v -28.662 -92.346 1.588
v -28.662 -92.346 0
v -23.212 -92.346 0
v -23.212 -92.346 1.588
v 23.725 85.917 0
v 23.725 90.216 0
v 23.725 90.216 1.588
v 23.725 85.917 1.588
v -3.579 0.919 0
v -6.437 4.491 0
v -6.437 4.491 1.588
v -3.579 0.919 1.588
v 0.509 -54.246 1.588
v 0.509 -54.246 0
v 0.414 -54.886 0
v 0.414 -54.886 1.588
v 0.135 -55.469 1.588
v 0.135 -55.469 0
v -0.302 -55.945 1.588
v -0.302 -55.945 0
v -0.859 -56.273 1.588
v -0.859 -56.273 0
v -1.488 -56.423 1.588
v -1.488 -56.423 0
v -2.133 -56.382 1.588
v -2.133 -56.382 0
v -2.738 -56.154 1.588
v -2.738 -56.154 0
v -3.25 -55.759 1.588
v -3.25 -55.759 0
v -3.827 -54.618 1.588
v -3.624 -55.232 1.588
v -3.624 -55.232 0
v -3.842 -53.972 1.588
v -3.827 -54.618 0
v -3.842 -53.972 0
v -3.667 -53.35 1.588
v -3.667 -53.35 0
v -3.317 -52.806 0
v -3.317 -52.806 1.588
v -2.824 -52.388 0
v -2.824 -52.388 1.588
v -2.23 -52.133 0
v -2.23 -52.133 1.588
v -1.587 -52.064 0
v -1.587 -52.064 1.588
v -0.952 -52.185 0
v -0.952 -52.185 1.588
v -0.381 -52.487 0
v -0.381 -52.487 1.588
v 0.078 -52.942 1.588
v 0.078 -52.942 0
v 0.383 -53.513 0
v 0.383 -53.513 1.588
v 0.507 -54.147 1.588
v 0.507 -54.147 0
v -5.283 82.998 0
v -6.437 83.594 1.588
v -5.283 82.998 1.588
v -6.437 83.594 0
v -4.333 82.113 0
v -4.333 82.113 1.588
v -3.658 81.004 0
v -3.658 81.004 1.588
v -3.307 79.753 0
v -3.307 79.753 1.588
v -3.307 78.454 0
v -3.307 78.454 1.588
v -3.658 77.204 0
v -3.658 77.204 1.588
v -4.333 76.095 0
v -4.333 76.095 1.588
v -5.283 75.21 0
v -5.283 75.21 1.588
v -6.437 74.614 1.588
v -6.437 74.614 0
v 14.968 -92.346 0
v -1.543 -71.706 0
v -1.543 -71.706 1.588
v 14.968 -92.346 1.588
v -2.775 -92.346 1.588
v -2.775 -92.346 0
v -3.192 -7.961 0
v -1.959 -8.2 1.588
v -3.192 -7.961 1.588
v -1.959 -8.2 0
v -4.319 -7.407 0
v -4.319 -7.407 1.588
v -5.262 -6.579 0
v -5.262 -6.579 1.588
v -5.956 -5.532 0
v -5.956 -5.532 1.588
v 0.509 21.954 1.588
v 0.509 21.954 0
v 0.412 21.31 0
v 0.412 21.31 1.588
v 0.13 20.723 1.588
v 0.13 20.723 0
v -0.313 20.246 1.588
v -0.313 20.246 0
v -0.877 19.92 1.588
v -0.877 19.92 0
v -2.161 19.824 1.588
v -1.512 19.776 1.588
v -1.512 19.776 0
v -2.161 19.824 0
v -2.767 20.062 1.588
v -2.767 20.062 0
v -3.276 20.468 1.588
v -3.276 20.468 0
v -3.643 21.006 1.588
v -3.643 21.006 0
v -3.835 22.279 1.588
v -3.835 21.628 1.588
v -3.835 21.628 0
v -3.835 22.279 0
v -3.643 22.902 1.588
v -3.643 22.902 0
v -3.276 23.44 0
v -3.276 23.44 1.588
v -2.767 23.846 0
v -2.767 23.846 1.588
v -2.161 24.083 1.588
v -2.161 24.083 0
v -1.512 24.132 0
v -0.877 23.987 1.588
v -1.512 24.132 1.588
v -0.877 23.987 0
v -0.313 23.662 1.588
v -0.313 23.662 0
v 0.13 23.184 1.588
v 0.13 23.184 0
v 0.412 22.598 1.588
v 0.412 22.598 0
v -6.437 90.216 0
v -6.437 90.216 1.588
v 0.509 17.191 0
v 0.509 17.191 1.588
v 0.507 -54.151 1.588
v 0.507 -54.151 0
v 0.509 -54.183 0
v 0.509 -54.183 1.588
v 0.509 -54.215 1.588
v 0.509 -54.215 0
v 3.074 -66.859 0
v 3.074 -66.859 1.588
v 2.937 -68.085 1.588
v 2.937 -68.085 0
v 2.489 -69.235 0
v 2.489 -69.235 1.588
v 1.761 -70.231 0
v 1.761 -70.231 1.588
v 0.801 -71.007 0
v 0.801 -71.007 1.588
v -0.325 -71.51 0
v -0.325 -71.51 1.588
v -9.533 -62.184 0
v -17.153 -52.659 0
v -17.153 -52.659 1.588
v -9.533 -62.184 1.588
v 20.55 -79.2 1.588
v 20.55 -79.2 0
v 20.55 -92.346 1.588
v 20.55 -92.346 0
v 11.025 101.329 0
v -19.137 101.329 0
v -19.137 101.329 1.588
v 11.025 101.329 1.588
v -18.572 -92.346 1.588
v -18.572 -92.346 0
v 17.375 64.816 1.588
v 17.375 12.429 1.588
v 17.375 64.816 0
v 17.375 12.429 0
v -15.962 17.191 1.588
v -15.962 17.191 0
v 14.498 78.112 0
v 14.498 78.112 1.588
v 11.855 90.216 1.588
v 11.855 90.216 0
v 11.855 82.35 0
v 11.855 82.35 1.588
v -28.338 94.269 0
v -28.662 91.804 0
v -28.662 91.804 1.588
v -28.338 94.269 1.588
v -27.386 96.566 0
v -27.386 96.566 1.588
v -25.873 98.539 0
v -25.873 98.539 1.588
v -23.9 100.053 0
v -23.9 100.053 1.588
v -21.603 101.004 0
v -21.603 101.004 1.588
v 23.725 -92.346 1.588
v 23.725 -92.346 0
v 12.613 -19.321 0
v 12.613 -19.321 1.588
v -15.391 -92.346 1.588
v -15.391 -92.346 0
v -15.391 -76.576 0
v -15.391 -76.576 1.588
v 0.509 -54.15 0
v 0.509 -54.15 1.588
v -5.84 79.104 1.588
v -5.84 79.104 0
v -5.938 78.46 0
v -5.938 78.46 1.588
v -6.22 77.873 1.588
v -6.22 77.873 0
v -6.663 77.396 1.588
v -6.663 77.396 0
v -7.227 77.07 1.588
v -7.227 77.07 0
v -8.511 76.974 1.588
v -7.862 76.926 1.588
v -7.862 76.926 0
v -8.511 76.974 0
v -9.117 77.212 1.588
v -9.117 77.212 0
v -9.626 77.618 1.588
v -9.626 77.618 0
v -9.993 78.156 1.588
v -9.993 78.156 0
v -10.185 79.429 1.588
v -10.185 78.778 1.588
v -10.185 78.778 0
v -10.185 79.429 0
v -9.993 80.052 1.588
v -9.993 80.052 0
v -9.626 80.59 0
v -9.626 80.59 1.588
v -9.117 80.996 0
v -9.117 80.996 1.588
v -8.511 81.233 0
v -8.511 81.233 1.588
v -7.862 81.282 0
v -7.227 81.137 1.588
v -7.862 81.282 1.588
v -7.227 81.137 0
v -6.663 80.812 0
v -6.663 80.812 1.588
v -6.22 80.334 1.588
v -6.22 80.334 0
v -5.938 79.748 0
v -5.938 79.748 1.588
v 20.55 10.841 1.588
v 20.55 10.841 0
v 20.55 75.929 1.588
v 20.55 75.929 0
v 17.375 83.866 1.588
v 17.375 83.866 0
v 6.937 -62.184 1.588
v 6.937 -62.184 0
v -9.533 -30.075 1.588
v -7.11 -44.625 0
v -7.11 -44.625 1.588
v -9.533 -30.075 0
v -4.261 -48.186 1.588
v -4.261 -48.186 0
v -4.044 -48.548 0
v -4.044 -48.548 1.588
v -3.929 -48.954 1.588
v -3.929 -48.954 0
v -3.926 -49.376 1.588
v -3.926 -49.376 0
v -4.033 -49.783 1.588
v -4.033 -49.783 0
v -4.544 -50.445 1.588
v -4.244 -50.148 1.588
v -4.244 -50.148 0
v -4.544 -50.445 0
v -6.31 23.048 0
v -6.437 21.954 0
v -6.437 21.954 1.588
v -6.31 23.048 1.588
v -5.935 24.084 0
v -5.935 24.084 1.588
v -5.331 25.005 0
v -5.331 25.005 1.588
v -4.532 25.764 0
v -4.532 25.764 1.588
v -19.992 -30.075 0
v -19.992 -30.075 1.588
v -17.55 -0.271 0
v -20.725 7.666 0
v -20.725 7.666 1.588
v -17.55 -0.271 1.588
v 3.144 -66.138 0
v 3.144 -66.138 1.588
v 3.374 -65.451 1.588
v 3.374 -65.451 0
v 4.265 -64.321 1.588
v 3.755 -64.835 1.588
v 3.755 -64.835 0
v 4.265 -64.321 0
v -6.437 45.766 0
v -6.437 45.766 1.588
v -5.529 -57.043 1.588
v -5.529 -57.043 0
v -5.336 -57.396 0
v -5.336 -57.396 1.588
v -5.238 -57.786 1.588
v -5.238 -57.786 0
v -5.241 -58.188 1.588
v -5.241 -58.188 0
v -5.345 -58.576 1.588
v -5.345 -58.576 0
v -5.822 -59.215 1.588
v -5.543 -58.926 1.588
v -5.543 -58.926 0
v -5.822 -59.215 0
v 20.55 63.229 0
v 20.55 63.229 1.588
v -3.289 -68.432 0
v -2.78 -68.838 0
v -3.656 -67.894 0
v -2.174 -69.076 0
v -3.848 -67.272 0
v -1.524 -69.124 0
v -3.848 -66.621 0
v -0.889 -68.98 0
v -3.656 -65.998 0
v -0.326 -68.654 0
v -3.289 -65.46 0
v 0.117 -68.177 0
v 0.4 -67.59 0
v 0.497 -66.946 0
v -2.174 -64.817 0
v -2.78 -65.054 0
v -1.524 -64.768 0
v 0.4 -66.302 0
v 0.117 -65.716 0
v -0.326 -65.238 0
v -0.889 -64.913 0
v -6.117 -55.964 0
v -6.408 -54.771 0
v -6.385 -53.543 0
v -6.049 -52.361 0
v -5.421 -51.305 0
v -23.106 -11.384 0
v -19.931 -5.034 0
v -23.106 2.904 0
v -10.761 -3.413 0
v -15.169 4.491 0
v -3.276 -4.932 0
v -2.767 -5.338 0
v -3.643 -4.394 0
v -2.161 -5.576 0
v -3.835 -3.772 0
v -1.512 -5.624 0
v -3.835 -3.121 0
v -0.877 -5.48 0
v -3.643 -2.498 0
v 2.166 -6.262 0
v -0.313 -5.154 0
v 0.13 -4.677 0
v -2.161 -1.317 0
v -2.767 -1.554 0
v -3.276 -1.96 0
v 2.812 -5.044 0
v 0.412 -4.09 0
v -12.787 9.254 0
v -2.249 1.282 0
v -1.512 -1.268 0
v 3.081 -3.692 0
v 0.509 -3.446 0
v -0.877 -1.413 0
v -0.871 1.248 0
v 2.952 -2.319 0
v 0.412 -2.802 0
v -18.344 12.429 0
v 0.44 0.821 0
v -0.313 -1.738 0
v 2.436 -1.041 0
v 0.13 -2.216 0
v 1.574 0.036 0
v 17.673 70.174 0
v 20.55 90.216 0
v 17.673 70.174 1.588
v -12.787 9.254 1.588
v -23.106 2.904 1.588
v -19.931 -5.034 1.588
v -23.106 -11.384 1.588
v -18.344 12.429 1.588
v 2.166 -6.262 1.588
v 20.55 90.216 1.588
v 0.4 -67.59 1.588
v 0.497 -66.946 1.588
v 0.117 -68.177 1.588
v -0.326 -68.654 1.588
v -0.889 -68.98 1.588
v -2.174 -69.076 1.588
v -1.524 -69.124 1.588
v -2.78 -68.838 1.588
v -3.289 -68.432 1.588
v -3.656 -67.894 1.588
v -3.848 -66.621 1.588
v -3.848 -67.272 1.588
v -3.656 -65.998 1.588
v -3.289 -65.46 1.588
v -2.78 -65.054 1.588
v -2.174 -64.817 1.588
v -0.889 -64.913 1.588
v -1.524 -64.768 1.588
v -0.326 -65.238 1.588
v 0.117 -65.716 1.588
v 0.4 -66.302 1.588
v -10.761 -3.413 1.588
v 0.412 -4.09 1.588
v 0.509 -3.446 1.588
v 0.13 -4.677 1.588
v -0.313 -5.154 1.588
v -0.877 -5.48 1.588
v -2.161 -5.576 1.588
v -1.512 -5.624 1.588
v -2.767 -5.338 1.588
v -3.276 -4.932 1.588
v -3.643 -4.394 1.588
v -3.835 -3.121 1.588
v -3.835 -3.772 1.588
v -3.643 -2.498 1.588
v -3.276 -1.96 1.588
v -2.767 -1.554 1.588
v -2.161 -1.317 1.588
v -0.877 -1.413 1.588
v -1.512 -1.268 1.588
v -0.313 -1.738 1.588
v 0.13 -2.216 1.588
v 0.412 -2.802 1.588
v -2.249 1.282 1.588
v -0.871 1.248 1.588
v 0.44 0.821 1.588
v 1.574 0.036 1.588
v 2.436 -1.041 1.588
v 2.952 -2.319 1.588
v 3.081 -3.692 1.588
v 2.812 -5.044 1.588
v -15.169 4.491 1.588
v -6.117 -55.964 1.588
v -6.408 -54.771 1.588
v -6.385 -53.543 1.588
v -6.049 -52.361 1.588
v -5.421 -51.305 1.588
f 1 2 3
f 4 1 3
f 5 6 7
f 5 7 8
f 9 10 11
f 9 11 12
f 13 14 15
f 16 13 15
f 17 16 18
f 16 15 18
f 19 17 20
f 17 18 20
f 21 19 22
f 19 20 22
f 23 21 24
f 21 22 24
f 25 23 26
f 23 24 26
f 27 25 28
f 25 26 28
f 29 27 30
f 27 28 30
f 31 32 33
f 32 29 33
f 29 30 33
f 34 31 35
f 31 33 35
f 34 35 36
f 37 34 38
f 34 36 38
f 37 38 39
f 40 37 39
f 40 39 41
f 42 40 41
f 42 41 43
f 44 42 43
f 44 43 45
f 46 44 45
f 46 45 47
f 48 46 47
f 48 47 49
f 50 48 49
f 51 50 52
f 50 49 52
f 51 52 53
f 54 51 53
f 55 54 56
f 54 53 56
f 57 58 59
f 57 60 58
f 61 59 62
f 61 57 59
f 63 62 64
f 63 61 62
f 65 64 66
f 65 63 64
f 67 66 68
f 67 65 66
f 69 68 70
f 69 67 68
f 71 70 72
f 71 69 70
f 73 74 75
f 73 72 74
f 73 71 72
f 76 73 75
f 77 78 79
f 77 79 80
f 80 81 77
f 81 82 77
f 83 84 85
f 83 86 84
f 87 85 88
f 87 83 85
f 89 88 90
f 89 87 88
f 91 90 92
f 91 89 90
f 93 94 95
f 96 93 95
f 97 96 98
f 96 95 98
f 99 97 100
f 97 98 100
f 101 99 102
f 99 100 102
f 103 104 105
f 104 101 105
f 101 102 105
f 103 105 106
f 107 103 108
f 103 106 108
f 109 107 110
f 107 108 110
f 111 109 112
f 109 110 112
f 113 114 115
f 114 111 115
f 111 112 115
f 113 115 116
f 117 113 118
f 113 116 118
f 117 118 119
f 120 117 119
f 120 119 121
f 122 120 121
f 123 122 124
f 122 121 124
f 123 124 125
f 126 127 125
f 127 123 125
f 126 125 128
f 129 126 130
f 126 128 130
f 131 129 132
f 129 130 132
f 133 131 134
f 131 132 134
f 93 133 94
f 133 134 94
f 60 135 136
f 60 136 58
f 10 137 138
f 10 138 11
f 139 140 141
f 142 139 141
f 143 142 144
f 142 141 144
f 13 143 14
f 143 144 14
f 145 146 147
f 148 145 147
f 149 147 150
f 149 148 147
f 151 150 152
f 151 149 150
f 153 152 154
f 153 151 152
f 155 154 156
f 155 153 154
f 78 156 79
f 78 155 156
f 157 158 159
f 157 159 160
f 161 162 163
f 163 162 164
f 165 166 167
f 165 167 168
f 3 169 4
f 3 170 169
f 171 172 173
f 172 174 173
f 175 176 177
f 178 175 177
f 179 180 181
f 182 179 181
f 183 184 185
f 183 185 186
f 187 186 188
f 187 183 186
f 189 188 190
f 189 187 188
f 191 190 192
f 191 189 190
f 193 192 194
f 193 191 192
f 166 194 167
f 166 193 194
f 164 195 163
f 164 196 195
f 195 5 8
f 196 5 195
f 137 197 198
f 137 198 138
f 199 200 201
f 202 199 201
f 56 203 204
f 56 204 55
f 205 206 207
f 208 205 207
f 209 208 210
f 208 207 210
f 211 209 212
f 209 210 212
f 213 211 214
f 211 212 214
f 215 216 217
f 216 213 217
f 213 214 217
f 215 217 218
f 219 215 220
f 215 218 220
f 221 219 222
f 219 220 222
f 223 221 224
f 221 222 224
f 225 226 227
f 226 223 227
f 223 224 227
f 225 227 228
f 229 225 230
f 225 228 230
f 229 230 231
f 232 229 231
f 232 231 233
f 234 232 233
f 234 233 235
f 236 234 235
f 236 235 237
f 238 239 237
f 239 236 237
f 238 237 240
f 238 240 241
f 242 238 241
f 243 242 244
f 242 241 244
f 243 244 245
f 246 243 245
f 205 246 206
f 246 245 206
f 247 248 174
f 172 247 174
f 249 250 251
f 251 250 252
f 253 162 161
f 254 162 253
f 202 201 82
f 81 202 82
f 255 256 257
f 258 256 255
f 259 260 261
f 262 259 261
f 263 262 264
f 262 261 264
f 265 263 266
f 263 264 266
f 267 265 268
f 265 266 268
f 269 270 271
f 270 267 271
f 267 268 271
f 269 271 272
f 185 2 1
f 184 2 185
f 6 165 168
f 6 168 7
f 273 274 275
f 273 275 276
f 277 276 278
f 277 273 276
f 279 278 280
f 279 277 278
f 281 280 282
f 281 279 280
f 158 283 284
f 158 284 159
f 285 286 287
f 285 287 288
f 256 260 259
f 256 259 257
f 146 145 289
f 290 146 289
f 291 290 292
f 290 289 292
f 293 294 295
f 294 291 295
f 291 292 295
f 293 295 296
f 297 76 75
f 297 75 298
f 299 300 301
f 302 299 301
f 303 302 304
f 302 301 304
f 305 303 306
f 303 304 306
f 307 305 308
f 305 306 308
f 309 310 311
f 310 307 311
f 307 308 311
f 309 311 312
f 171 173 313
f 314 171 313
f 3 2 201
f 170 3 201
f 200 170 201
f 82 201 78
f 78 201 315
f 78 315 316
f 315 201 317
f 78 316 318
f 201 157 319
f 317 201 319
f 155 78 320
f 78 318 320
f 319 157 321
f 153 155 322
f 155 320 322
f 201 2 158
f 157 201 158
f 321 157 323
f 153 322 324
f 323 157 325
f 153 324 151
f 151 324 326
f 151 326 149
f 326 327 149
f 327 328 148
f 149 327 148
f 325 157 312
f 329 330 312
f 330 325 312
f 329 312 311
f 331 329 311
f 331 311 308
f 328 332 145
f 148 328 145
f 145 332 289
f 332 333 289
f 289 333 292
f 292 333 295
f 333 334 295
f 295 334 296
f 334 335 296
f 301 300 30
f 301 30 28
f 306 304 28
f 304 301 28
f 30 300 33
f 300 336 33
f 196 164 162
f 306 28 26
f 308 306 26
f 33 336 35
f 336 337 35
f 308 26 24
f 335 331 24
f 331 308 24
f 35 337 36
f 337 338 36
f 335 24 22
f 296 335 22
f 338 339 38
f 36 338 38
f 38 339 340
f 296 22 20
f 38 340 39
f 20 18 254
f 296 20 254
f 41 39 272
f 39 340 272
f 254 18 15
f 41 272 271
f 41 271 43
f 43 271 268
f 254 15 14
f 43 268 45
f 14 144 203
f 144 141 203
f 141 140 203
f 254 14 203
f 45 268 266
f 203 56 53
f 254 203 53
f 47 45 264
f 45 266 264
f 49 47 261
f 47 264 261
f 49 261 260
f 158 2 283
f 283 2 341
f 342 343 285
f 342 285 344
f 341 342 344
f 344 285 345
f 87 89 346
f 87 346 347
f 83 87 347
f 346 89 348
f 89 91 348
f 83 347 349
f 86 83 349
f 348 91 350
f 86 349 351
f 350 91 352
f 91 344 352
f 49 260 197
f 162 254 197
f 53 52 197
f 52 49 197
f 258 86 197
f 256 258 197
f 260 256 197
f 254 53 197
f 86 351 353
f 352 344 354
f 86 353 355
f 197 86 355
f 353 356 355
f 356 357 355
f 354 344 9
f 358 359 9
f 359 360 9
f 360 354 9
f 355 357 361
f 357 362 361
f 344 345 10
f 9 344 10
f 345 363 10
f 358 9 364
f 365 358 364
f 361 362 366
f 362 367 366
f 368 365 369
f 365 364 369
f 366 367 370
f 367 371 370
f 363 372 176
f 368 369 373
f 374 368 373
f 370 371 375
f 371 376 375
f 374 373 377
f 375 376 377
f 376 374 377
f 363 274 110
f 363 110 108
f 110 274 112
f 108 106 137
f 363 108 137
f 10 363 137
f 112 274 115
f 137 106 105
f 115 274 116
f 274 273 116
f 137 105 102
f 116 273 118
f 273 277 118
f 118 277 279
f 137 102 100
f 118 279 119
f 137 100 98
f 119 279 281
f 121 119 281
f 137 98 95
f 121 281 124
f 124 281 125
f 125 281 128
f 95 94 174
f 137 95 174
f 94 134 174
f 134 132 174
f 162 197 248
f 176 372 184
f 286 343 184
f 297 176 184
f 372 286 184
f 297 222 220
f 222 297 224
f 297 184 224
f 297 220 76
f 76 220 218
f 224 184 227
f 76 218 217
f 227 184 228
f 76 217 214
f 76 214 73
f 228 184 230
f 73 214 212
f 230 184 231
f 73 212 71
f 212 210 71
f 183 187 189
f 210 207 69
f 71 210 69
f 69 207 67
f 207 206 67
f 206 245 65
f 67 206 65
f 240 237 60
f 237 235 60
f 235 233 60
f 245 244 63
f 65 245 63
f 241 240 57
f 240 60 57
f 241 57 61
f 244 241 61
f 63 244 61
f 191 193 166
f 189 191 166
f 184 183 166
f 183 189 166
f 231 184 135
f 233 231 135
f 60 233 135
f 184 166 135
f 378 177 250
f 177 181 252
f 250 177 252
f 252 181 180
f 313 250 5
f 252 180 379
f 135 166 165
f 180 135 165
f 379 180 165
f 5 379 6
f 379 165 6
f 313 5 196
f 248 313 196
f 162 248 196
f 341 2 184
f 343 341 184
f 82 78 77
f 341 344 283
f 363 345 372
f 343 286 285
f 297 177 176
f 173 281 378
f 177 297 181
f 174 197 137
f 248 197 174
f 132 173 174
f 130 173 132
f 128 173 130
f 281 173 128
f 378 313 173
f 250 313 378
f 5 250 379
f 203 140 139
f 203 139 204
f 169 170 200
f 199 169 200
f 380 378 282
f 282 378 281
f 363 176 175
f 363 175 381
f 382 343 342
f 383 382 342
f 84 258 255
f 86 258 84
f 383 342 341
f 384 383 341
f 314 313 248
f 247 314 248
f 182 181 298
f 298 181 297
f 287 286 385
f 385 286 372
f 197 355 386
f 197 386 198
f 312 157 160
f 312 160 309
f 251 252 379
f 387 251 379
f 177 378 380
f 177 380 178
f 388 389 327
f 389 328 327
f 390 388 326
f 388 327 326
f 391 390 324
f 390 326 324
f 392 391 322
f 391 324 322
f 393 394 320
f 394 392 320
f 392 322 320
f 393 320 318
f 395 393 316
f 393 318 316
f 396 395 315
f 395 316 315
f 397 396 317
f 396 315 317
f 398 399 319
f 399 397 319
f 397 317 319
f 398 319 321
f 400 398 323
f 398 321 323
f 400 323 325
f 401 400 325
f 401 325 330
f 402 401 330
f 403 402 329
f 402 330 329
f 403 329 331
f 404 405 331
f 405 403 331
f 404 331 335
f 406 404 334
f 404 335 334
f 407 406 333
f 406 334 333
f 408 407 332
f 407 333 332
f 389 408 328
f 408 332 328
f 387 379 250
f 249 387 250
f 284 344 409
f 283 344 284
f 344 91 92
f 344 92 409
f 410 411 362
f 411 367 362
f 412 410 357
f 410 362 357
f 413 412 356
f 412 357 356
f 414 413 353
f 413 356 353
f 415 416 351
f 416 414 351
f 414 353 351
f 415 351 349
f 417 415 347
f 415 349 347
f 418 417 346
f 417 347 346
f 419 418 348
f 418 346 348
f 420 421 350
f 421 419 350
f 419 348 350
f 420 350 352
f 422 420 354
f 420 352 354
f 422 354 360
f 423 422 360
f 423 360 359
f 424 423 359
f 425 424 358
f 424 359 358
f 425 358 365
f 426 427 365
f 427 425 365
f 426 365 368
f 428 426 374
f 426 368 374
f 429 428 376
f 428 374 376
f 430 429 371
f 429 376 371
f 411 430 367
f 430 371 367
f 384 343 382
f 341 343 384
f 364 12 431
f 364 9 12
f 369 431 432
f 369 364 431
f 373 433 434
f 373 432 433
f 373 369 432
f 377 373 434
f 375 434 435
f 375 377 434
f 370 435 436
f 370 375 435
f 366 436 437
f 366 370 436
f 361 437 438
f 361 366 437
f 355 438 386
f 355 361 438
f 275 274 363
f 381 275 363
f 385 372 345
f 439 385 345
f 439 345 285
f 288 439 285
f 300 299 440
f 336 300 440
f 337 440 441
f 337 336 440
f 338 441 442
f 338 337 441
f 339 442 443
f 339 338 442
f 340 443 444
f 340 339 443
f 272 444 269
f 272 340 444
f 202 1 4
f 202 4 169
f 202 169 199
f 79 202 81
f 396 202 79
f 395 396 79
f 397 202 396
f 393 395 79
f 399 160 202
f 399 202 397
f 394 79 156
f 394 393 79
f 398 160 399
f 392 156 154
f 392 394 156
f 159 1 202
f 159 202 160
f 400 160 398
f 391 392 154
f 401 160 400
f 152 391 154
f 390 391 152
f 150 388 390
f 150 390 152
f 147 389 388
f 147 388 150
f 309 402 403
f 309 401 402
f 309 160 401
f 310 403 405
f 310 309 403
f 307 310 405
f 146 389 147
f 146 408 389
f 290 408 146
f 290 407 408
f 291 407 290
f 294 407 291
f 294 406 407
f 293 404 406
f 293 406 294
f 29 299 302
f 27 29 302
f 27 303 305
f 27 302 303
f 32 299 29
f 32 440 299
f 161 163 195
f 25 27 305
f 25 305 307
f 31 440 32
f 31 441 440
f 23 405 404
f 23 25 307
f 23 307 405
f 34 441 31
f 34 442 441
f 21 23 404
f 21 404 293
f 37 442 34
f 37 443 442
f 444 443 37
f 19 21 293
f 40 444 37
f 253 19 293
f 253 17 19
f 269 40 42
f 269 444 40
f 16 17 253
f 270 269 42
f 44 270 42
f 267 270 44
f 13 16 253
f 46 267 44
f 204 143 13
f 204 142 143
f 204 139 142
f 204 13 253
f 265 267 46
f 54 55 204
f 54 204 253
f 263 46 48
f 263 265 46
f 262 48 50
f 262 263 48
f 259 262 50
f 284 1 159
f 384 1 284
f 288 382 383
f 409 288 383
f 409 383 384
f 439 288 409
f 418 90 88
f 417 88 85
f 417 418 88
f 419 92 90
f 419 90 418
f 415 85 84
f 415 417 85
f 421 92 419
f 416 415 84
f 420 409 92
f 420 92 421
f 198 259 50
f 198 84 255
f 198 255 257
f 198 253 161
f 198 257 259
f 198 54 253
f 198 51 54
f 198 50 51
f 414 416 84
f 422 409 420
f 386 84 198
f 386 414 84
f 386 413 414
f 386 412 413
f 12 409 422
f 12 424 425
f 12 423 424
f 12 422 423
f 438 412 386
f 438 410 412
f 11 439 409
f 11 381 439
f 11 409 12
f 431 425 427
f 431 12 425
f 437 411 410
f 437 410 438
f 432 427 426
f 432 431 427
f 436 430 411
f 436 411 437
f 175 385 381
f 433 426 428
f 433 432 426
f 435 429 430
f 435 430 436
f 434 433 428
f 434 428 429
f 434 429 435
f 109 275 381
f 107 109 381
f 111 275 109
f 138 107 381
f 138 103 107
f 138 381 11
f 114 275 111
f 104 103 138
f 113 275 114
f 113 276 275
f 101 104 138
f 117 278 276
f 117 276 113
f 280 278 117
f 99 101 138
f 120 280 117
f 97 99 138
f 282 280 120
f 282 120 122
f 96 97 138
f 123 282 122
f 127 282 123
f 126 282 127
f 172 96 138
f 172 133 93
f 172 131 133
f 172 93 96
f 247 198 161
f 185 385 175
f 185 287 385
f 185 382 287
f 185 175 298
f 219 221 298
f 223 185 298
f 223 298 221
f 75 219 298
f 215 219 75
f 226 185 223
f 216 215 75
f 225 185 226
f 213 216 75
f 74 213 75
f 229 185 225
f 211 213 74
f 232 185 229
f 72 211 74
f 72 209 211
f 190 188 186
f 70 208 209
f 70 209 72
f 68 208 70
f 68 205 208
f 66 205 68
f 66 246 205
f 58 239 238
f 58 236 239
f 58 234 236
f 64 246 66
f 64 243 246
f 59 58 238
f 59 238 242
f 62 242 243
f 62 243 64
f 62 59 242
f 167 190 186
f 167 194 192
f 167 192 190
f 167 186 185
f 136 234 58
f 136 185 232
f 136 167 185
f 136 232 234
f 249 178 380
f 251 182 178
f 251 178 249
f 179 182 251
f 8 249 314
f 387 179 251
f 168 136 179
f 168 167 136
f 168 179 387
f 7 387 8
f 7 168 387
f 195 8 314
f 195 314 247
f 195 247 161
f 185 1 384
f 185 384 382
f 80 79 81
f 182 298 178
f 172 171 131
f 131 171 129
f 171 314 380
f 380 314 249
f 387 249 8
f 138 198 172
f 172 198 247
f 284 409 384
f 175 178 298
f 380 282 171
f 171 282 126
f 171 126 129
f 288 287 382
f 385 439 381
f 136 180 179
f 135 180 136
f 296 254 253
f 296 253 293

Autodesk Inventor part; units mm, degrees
ref_plane "YZ Plane" through (0, 0, 0) normal (1, 0, 0) x (0, 1, 0)
ref_plane "XZ Plane" through (0, 0, 0) normal (0, 1, 0) x (-1, 0, 0)
ref_plane "XY Plane" through (0, 0, 0) normal (0, 0, 1) x (1, 0, 0)
sketch "Sketch1" plane through (0, 0, 0) normal (0, 0, 1) x (1, 0, 0)
  circle A0 centre (-1.6749, 21.9538) radius 2.1844
  circle A1 centre (-1.6749, -3.4462) radius 2.1844
  line L0 (23.7251, 85.917) -> (23.7251, -92.3462)
  line L1 (-28.6624, -92.3462) -> (-28.6624, 91.8038)
  line L2 (17.3751, 64.8163) -> (20.5501, 63.2288)
  line L3 (20.5501, 63.2288) -> (20.5501, 10.8413)
  line L4 (20.5501, 10.8413) -> (17.3751, 12.4288)
  line L5 (17.3751, 12.4288) -> (17.3751, 64.8163)
  line L6 (20.5501, 75.9288) -> (17.3751, 83.8663)
  line L7 (20.5501, 90.2163) -> (20.5501, 75.9288)
  line L8 (17.6728, 70.1741) -> (14.4978, 78.1116)
  line L9 (17.3751, 83.8663) -> (20.5501, 90.2163)
  line L10 (-18.3436, 12.4288) -> (-15.1686, 4.4913)
  line L11 (-15.9624, 17.1913) -> (-12.7874, 9.2538)
  line L12 (-15.9624, 17.1913) -> (14.4978, 78.1116)
  line L13 (-23.1061, 2.9038) -> (-19.9311, -5.0337)
  line L14 (-23.1061, 2.9038) -> (-23.1061, -11.3837)
  line L15 (-20.7249, 7.6663) -> (-18.3436, 12.4288)
  line L16 (-15.1686, 4.4913) -> (-17.5499, -0.2712)
  line L17 (-19.9311, -5.0337) -> (-23.1061, -11.3837)
  line L18 (11.8546, 90.2163) -> (11.8546, 82.3502)
  line L19 (11.8546, 90.2163) -> (-6.4374, 90.2163)
  line L20 (11.8546, 82.3502) -> (-6.4374, 45.7663)
  line L21 (0.5095, 17.1913) -> (-6.4374, 4.4913)
  line L22 (12.6126, -19.3212) -> (0.5095, 17.1913)
  line L23 (-10.761, -3.4129) -> (-19.992, -30.0754)
  line L24 (-19.992, -30.0754) -> (-17.153, -52.6587)
  line L25 (-17.153, -52.6587) -> (-9.533, -62.1837)
  line L26 (-7.1105, -44.6247) -> (-9.533, -30.0754)
  line L27 (-9.533, -30.0754) -> (-1.9594, -8.2002)
  line L28 (-5.9563, -5.5321) -> (-10.761, -3.4129)
  line L29 (20.5501, -79.2004) -> (20.5501, -92.3462)
  line L30 (6.9368, -62.1837) -> (4.2652, -64.3209)
  line L31 (-1.5433, -71.7065) -> (14.9685, -92.3462)
  arc A2 (-1.5433, -71.7065) -> (3.0742, -66.8586) centre (-1.6875, -66.9462) ccw
  circle A3 centre (-1.6875, -66.9462) radius 2.1844
  arc A4 (4.2652, -64.3209) -> (3.0742, -66.8586) centre (6.2486, -66.8002) ccw
  line L32 (20.5501, -79.2004) -> (6.9368, -62.1837)
  line L33 (23.7251, -92.3462) -> (20.5501, -92.3462)
  circle A5 centre (-1.6749, -54.2462) radius 2.1844
  arc A6 (-4.5442, -50.4451) -> (-5.5294, -57.0433) centre (-1.6749, -54.2462) ccw
  line L34 (-9.533, -62.1837) -> (-5.8225, -59.2153)
  line L35 (0.5075, -54.1513) -> (0.5095, -54.1497)
  line L36 (0.5095, -54.1497) -> (0.5073, -54.1469)
  line L37 (-4.2611, -48.1864) -> (-7.1105, -44.6247)
  arc A7 (-4.5442, -50.4451) -> (-4.2611, -48.1864) centre (-5.5007, -49.1781) ccw
  arc A8 (-5.8225, -59.2153) -> (-5.5294, -57.0433) centre (-6.8142, -57.9757) ccw
  arc A9 (-4.5324, 25.7638) -> (-6.4374, 21.9538) centre (-1.6749, 21.9538) ccw
  line L38 (17.6728, 70.1741) -> (-4.5324, 25.7638)
  line L39 (-6.4374, 21.9538) -> (-12.7874, 9.2538)
  line L40 (-6.4374, 4.4913) -> (-3.5794, 0.9189)
  line L41 (2.1657, -6.2625) -> (12.6126, -19.3212)
  arc A10 (2.1657, -6.2625) -> (-3.5794, 0.9189) centre (-1.6749, -3.4462) ccw
  arc A11 (-5.9563, -5.5321) -> (-1.9594, -8.2002) centre (-1.6749, -3.4462) ccw
  line L42 (14.9685, -92.3462) -> (44.3118, -92.3462) construction
  line L43 (-2.7748, -92.3462) -> (14.9685, -92.3462)
  line L44 (-28.6624, -92.3462) -> (-23.2121, -92.3462)
  line L45 (-18.5725, -92.3462) -> (-28.6624, -92.3462)
  line L46 (-20.7249, 7.6663) -> (-17.5499, -0.2712)
  line L47 (-28.6624, 98.1538) -> (-28.6624, 101.3288)
  line L48 (-19.1374, 101.3288) -> (11.0251, 101.3288)
  line L49 (23.7251, 90.2163) -> (23.7251, 85.917)
  line L50 (11.0251, 101.3288) -> (23.7251, 90.2163)
  arc A12 (-19.1374, 101.3288) -> (-28.6624, 91.8038) centre (-19.1374, 91.8038) ccw
  arc A13 (-6.4374, 74.6137) -> (-6.4374, 83.5939) centre (-8.0249, 79.1038) ccw
  circle A14 centre (-8.0249, 79.1038) radius 2.1844
  line L51 (-6.4374, 90.2163) -> (-6.4374, 83.5939)
  line L52 (-6.4374, 74.6137) -> (-6.4374, 45.7663)
  line L53 (-18.5725, -92.3462) -> (-15.3911, -92.3462)
  line L54 (-15.3911, -92.3462) -> (-15.3911, -76.5759)
  line L55 (-15.3911, -76.5759) -> (-2.7748, -92.3462)
  point P0 (0, 0)
  point P1 (2.838, -65.4627)
  point P2 (-4.4495, -58.1169)
  point P3 (-3.0588, -49.6892)
  dimension "d0" = 4.3688
  dimension "d1" = 4.3688
  dimension "d3" = 9.525
  dimension "d4" = 4.3688
  dimension "d5" = 3.175
  dimension "d6" = 9.525
  dimension "d7" = 1.5875
  dimension "d8" = 9.525
  dimension "d14" = 3.175
  dimension "d15" = 9.525
  dimension "d18" = 9.525
  dimension "d19" = 4.3688
  dimension "d20" = 3.1814
extrude "Extrusion1" add sketch "Sketch1" along normal blind 1.5875
equation "\"BendRadius\" = Thickness"
equation "\"BendReliefWidth\" = Thickness"
equation "\"BendReliefDepth\" = 0.5 * Thickness"
equation "\"CornerReliefSize\" = 4 * Thickness"
equation "\"MinimumRemnant\" = 2 * Thickness"
equation "\"TransitionRadius\" = BendRadius"
equation "\"JacobiRadiusSize\" = BendRadius"
equation "\"GapSize\" = Thickness"
equation "\"Thickness\" = 1.5875"
properties part number "sideplate" material "Acetal Resin, White"
